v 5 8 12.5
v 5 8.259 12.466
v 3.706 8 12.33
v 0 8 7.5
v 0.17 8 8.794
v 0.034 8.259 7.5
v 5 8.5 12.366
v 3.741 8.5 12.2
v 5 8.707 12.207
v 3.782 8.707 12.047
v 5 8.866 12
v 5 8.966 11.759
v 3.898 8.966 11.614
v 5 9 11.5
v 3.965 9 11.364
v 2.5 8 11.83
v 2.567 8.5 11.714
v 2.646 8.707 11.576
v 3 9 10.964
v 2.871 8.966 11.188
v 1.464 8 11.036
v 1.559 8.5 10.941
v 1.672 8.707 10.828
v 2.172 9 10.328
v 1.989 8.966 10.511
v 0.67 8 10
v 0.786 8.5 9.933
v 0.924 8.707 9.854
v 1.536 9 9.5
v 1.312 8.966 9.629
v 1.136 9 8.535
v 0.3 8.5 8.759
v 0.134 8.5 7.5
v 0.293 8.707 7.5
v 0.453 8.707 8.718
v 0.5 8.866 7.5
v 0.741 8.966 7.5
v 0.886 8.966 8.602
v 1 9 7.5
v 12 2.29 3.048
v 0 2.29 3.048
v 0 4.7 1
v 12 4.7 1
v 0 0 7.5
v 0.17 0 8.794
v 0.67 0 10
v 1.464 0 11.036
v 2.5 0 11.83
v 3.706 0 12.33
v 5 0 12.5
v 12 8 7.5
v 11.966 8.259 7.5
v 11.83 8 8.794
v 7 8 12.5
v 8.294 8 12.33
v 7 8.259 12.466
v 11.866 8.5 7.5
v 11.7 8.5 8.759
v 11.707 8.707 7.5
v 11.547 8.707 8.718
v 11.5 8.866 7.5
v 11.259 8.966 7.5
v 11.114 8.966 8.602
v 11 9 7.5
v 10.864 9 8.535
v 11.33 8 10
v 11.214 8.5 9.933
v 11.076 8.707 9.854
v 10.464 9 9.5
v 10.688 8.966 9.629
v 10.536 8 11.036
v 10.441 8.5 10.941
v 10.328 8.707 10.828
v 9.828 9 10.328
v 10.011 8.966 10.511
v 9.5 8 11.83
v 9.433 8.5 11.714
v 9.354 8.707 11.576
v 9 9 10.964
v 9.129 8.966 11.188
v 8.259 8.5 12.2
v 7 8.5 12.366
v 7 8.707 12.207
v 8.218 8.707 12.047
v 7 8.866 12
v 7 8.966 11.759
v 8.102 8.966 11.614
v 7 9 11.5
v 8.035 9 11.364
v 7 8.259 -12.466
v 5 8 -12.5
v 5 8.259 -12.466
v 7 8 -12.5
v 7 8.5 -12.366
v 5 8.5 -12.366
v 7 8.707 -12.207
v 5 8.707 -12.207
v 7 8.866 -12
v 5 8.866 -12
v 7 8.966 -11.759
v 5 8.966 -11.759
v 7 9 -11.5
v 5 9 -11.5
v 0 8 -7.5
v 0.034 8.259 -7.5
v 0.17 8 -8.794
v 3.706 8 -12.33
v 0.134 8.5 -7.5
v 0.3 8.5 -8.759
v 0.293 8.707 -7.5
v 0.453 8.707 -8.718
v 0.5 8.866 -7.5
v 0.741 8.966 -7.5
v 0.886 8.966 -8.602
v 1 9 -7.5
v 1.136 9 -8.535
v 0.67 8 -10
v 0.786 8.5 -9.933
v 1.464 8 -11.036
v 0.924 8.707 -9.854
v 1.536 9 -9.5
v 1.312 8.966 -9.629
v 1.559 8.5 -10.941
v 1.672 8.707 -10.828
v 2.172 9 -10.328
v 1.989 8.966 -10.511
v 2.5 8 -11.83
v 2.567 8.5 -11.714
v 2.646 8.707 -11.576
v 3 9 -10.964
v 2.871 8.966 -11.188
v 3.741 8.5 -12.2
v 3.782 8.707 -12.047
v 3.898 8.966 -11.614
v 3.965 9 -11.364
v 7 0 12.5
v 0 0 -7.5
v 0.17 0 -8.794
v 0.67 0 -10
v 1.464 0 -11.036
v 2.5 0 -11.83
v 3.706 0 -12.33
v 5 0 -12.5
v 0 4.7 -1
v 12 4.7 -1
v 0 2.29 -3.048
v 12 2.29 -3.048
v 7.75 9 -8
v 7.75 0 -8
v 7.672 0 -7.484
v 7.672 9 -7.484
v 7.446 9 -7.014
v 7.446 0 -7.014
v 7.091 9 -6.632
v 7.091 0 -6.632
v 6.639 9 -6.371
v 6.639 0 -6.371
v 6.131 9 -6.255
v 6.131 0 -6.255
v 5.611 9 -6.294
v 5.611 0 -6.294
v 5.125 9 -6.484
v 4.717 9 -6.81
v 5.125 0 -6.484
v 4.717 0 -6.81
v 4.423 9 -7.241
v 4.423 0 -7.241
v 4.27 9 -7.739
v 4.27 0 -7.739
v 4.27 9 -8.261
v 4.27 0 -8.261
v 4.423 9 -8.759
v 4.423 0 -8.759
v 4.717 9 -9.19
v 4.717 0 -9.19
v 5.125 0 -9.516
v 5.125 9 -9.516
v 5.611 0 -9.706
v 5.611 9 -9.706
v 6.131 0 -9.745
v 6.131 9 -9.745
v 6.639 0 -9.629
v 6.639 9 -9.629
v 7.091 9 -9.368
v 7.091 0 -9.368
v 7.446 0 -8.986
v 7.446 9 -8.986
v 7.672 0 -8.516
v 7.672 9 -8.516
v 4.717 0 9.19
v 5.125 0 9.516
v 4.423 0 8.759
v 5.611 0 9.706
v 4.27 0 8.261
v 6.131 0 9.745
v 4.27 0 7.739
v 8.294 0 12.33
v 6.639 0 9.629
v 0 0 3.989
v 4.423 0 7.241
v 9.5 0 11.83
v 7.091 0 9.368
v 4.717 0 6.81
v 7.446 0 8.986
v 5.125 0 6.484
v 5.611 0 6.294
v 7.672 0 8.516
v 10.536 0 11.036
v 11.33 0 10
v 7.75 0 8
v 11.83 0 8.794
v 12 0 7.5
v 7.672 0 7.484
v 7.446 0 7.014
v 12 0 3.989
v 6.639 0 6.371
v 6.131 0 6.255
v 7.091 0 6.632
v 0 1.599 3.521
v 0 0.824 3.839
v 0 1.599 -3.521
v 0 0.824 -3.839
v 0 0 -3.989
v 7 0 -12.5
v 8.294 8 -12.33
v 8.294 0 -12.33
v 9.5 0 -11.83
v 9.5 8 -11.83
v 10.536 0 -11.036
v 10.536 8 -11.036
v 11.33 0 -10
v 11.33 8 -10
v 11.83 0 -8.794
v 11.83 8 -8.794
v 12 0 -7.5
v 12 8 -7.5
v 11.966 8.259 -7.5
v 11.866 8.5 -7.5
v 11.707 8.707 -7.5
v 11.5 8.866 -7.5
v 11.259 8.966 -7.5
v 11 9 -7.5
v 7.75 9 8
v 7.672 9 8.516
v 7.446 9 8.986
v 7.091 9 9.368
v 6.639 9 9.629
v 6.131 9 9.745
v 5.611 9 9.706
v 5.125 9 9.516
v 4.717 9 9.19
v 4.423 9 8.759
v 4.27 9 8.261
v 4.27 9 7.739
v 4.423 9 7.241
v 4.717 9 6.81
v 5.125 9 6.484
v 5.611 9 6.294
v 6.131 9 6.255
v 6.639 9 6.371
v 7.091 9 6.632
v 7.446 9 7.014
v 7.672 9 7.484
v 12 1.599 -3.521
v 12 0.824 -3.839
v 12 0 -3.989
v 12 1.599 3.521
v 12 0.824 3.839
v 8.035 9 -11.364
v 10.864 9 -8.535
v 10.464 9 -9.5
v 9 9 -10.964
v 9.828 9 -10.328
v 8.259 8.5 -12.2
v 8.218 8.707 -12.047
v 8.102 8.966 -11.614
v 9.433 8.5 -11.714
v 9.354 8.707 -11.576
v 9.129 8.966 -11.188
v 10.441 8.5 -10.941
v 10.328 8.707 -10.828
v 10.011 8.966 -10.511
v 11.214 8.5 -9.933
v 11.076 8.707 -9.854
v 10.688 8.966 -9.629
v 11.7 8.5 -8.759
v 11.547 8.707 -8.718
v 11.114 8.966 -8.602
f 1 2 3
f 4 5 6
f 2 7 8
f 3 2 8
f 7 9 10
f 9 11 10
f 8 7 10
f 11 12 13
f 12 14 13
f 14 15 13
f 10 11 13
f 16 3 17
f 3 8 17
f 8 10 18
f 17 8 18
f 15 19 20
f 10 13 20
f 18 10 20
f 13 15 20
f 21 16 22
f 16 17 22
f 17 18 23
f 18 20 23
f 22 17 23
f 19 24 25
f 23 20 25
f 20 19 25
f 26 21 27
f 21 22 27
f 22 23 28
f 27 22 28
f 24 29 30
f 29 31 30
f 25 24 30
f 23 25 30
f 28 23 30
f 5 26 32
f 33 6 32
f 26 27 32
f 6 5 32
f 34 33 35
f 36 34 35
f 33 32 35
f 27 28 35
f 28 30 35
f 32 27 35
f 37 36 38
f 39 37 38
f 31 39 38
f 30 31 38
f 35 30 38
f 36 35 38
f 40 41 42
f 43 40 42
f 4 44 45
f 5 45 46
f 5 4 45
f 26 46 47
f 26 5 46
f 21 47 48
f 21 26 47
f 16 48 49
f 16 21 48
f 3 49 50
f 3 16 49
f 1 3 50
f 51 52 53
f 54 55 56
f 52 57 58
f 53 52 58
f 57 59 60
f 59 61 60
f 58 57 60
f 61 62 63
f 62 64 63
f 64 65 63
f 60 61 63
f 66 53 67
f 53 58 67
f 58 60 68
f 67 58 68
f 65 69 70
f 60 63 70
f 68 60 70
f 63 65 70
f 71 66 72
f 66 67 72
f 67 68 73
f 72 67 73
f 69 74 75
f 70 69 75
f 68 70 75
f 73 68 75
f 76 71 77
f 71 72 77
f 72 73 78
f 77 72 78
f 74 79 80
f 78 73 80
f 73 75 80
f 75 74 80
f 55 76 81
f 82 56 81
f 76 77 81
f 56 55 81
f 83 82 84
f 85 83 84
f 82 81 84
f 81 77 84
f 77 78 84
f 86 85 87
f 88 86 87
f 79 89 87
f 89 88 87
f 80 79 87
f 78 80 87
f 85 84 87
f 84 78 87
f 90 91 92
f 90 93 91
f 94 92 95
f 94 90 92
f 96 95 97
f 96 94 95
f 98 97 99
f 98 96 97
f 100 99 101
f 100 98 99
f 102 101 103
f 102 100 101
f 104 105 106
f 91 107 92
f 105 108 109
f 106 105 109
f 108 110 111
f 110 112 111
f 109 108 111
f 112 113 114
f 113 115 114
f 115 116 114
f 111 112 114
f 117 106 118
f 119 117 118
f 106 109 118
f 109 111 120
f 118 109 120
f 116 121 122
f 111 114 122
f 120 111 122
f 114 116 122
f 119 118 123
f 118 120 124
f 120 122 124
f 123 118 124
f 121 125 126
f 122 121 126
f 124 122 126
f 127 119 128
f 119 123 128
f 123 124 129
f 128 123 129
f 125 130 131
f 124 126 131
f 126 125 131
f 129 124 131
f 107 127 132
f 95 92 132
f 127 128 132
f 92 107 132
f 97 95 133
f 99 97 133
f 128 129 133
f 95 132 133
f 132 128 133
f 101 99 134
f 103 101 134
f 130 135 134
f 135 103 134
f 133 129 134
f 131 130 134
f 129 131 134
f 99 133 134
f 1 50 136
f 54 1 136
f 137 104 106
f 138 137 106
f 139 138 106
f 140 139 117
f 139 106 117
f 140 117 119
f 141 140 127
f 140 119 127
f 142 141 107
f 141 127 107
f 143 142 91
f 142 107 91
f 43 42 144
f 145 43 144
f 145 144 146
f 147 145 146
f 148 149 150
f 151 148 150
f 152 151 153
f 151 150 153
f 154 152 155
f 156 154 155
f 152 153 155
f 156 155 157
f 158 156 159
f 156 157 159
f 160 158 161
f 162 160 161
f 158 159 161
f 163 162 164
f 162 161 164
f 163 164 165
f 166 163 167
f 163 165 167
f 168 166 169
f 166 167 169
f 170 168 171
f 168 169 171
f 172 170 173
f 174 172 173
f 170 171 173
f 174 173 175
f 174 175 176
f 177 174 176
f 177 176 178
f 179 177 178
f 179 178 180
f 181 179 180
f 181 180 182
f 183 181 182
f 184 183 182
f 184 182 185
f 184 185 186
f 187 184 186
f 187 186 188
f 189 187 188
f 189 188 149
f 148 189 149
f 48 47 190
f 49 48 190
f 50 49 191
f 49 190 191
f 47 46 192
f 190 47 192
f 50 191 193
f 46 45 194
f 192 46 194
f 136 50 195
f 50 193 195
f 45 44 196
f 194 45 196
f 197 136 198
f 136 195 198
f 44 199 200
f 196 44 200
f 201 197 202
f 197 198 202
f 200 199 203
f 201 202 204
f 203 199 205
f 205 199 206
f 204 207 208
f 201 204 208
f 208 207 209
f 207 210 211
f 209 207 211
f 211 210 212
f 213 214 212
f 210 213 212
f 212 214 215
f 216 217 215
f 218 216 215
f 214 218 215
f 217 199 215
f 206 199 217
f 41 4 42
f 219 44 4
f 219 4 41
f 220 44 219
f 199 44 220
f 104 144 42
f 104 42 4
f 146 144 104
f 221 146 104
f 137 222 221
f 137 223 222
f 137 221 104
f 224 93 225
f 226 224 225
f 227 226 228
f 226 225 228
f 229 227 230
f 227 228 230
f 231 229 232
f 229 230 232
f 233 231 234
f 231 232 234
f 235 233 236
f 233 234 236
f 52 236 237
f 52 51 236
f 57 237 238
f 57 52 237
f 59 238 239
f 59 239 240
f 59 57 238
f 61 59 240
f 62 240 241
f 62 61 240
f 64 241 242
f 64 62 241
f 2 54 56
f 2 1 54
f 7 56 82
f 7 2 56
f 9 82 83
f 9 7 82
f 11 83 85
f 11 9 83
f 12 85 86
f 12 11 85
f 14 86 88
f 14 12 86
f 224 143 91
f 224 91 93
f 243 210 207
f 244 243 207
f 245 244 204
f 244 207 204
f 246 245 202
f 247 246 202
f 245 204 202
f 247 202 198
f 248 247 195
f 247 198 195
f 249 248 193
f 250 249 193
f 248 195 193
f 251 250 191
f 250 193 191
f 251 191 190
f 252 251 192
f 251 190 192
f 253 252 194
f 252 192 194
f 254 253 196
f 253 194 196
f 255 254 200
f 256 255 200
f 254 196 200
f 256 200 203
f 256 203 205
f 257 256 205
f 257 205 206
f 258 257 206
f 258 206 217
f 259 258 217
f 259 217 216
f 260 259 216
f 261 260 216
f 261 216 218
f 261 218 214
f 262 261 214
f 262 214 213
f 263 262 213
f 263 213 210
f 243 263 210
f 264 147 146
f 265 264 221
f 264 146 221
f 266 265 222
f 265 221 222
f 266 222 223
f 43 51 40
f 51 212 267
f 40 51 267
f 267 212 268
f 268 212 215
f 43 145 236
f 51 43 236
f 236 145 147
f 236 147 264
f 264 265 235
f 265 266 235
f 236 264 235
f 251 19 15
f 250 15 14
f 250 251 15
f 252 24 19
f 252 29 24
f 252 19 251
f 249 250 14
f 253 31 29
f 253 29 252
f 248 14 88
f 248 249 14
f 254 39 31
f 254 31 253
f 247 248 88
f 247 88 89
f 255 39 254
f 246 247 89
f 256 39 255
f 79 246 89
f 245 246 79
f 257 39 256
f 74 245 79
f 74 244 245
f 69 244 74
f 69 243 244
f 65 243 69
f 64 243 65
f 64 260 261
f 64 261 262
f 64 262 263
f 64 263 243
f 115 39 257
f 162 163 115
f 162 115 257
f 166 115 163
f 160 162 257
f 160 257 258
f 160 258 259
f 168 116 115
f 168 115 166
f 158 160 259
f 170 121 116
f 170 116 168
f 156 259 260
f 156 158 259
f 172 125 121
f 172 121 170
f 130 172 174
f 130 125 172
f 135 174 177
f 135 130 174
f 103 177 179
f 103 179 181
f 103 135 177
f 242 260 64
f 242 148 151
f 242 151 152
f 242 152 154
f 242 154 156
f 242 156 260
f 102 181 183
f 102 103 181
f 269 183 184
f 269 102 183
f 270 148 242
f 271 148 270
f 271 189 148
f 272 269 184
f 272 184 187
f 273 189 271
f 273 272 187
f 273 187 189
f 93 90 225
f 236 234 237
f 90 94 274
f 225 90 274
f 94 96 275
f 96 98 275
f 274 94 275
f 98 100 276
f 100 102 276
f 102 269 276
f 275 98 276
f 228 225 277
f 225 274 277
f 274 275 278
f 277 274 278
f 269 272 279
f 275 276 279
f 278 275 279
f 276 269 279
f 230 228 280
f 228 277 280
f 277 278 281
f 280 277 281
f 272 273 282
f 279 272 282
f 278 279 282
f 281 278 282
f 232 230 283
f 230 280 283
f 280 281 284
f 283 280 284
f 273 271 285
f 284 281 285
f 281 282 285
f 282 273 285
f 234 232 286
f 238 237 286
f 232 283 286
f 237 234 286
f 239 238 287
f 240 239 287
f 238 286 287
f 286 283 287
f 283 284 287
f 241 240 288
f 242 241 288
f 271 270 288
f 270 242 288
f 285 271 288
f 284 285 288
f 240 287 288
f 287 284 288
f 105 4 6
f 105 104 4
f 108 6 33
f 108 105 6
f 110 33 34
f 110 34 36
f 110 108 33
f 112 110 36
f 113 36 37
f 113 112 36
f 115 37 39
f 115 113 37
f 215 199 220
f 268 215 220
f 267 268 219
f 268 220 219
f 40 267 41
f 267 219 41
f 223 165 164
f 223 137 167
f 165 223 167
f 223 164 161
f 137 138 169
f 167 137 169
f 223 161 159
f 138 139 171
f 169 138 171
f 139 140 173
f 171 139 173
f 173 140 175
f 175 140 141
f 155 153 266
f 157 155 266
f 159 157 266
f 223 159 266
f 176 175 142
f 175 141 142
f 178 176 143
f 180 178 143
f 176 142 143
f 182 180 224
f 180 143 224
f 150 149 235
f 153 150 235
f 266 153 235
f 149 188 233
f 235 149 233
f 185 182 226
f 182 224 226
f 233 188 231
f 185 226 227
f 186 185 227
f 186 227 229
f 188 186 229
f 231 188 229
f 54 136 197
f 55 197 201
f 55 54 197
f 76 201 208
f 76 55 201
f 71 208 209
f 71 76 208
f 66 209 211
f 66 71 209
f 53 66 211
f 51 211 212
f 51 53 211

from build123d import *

# Parameters (mm, degrees)
CROQUIS1_W              = 12
CROQUIS1_H              = 25
SALIENTE_EXTRUIR1_DEPTH = 9
CORTAR_EXTRUIR1_DEPTH   = 13
CROQUIS4_R              = 1.75
CORTAR_EXTRUIR2_DEPTH   = 10
REDONDEO1_R             = 5
REDONDEO2_R             = 1


with BuildPart() as part:
    # Croquis1 → Saliente-Extruir1 (new body)
    with BuildSketch(Plane(origin=(0, 0, 0), x_dir=(1, 0, 0), z_dir=(0, 1, 0))):
        with Locations((6, 0)):
            Rectangle(CROQUIS1_W, CROQUIS1_H)
    extrude(amount=SALIENTE_EXTRUIR1_DEPTH)

    # Croquis3 → Cortar-Extruir1 (cut, through all)
    with BuildSketch(Plane(origin=(0, 0, 0), x_dir=(0, 0, -1), z_dir=(1, 0, 0))):
        with BuildLine():
            Line((-3.047905892, 2.290418822), (-1, 4.7))
            Line((-1, 4.7), (1, 4.7))
            Line((1, 4.7), (3.047905892, 2.290418822))
            ThreePointArc((3.047905892, 2.290418822), (0, -4.3), (-3.047905892, 2.290418822))
        make_face()
    extrude(amount=CORTAR_EXTRUIR1_DEPTH, mode=Mode.SUBTRACT)

    # Croquis4 → Cortar-Extruir2 (cut, through all)
    with BuildSketch(Plane.XZ):
        with Locations((6, 8)):
            Circle(CROQUIS4_R)
        with Locations((6, -8)):
            Circle(CROQUIS4_R)
    extrude(amount=-CORTAR_EXTRUIR2_DEPTH, mode=Mode.SUBTRACT)

    # Redondeo1
    redondeo1_edges = [part.edges().sort_by_distance(p)[0] for p in [
        (0, 4.5, -12.5),
        (12, 4.5, -12.5),
        (12, 4.5, 12.5),
        (0, 4.5, 12.5),
    ]]
    fillet(redondeo1_edges, radius=REDONDEO1_R)

    # Redondeo2
    redondeo2_edges = [part.edges().sort_by_distance(p)[0] for p in [
        (0, 9, 0),
        (6, 9, -12.5),
        (6, 9, 12.5),
        (12, 9, 0),
        (1.464466094, 9, 11.035533906),
        (10.535533906, 9, 11.035533906),
        (10.535533906, 9, -11.035533906),
        (1.464466094, 9, -11.035533906),
    ]]
    fillet(redondeo2_edges, radius=REDONDEO2_R)


solid = part.part
